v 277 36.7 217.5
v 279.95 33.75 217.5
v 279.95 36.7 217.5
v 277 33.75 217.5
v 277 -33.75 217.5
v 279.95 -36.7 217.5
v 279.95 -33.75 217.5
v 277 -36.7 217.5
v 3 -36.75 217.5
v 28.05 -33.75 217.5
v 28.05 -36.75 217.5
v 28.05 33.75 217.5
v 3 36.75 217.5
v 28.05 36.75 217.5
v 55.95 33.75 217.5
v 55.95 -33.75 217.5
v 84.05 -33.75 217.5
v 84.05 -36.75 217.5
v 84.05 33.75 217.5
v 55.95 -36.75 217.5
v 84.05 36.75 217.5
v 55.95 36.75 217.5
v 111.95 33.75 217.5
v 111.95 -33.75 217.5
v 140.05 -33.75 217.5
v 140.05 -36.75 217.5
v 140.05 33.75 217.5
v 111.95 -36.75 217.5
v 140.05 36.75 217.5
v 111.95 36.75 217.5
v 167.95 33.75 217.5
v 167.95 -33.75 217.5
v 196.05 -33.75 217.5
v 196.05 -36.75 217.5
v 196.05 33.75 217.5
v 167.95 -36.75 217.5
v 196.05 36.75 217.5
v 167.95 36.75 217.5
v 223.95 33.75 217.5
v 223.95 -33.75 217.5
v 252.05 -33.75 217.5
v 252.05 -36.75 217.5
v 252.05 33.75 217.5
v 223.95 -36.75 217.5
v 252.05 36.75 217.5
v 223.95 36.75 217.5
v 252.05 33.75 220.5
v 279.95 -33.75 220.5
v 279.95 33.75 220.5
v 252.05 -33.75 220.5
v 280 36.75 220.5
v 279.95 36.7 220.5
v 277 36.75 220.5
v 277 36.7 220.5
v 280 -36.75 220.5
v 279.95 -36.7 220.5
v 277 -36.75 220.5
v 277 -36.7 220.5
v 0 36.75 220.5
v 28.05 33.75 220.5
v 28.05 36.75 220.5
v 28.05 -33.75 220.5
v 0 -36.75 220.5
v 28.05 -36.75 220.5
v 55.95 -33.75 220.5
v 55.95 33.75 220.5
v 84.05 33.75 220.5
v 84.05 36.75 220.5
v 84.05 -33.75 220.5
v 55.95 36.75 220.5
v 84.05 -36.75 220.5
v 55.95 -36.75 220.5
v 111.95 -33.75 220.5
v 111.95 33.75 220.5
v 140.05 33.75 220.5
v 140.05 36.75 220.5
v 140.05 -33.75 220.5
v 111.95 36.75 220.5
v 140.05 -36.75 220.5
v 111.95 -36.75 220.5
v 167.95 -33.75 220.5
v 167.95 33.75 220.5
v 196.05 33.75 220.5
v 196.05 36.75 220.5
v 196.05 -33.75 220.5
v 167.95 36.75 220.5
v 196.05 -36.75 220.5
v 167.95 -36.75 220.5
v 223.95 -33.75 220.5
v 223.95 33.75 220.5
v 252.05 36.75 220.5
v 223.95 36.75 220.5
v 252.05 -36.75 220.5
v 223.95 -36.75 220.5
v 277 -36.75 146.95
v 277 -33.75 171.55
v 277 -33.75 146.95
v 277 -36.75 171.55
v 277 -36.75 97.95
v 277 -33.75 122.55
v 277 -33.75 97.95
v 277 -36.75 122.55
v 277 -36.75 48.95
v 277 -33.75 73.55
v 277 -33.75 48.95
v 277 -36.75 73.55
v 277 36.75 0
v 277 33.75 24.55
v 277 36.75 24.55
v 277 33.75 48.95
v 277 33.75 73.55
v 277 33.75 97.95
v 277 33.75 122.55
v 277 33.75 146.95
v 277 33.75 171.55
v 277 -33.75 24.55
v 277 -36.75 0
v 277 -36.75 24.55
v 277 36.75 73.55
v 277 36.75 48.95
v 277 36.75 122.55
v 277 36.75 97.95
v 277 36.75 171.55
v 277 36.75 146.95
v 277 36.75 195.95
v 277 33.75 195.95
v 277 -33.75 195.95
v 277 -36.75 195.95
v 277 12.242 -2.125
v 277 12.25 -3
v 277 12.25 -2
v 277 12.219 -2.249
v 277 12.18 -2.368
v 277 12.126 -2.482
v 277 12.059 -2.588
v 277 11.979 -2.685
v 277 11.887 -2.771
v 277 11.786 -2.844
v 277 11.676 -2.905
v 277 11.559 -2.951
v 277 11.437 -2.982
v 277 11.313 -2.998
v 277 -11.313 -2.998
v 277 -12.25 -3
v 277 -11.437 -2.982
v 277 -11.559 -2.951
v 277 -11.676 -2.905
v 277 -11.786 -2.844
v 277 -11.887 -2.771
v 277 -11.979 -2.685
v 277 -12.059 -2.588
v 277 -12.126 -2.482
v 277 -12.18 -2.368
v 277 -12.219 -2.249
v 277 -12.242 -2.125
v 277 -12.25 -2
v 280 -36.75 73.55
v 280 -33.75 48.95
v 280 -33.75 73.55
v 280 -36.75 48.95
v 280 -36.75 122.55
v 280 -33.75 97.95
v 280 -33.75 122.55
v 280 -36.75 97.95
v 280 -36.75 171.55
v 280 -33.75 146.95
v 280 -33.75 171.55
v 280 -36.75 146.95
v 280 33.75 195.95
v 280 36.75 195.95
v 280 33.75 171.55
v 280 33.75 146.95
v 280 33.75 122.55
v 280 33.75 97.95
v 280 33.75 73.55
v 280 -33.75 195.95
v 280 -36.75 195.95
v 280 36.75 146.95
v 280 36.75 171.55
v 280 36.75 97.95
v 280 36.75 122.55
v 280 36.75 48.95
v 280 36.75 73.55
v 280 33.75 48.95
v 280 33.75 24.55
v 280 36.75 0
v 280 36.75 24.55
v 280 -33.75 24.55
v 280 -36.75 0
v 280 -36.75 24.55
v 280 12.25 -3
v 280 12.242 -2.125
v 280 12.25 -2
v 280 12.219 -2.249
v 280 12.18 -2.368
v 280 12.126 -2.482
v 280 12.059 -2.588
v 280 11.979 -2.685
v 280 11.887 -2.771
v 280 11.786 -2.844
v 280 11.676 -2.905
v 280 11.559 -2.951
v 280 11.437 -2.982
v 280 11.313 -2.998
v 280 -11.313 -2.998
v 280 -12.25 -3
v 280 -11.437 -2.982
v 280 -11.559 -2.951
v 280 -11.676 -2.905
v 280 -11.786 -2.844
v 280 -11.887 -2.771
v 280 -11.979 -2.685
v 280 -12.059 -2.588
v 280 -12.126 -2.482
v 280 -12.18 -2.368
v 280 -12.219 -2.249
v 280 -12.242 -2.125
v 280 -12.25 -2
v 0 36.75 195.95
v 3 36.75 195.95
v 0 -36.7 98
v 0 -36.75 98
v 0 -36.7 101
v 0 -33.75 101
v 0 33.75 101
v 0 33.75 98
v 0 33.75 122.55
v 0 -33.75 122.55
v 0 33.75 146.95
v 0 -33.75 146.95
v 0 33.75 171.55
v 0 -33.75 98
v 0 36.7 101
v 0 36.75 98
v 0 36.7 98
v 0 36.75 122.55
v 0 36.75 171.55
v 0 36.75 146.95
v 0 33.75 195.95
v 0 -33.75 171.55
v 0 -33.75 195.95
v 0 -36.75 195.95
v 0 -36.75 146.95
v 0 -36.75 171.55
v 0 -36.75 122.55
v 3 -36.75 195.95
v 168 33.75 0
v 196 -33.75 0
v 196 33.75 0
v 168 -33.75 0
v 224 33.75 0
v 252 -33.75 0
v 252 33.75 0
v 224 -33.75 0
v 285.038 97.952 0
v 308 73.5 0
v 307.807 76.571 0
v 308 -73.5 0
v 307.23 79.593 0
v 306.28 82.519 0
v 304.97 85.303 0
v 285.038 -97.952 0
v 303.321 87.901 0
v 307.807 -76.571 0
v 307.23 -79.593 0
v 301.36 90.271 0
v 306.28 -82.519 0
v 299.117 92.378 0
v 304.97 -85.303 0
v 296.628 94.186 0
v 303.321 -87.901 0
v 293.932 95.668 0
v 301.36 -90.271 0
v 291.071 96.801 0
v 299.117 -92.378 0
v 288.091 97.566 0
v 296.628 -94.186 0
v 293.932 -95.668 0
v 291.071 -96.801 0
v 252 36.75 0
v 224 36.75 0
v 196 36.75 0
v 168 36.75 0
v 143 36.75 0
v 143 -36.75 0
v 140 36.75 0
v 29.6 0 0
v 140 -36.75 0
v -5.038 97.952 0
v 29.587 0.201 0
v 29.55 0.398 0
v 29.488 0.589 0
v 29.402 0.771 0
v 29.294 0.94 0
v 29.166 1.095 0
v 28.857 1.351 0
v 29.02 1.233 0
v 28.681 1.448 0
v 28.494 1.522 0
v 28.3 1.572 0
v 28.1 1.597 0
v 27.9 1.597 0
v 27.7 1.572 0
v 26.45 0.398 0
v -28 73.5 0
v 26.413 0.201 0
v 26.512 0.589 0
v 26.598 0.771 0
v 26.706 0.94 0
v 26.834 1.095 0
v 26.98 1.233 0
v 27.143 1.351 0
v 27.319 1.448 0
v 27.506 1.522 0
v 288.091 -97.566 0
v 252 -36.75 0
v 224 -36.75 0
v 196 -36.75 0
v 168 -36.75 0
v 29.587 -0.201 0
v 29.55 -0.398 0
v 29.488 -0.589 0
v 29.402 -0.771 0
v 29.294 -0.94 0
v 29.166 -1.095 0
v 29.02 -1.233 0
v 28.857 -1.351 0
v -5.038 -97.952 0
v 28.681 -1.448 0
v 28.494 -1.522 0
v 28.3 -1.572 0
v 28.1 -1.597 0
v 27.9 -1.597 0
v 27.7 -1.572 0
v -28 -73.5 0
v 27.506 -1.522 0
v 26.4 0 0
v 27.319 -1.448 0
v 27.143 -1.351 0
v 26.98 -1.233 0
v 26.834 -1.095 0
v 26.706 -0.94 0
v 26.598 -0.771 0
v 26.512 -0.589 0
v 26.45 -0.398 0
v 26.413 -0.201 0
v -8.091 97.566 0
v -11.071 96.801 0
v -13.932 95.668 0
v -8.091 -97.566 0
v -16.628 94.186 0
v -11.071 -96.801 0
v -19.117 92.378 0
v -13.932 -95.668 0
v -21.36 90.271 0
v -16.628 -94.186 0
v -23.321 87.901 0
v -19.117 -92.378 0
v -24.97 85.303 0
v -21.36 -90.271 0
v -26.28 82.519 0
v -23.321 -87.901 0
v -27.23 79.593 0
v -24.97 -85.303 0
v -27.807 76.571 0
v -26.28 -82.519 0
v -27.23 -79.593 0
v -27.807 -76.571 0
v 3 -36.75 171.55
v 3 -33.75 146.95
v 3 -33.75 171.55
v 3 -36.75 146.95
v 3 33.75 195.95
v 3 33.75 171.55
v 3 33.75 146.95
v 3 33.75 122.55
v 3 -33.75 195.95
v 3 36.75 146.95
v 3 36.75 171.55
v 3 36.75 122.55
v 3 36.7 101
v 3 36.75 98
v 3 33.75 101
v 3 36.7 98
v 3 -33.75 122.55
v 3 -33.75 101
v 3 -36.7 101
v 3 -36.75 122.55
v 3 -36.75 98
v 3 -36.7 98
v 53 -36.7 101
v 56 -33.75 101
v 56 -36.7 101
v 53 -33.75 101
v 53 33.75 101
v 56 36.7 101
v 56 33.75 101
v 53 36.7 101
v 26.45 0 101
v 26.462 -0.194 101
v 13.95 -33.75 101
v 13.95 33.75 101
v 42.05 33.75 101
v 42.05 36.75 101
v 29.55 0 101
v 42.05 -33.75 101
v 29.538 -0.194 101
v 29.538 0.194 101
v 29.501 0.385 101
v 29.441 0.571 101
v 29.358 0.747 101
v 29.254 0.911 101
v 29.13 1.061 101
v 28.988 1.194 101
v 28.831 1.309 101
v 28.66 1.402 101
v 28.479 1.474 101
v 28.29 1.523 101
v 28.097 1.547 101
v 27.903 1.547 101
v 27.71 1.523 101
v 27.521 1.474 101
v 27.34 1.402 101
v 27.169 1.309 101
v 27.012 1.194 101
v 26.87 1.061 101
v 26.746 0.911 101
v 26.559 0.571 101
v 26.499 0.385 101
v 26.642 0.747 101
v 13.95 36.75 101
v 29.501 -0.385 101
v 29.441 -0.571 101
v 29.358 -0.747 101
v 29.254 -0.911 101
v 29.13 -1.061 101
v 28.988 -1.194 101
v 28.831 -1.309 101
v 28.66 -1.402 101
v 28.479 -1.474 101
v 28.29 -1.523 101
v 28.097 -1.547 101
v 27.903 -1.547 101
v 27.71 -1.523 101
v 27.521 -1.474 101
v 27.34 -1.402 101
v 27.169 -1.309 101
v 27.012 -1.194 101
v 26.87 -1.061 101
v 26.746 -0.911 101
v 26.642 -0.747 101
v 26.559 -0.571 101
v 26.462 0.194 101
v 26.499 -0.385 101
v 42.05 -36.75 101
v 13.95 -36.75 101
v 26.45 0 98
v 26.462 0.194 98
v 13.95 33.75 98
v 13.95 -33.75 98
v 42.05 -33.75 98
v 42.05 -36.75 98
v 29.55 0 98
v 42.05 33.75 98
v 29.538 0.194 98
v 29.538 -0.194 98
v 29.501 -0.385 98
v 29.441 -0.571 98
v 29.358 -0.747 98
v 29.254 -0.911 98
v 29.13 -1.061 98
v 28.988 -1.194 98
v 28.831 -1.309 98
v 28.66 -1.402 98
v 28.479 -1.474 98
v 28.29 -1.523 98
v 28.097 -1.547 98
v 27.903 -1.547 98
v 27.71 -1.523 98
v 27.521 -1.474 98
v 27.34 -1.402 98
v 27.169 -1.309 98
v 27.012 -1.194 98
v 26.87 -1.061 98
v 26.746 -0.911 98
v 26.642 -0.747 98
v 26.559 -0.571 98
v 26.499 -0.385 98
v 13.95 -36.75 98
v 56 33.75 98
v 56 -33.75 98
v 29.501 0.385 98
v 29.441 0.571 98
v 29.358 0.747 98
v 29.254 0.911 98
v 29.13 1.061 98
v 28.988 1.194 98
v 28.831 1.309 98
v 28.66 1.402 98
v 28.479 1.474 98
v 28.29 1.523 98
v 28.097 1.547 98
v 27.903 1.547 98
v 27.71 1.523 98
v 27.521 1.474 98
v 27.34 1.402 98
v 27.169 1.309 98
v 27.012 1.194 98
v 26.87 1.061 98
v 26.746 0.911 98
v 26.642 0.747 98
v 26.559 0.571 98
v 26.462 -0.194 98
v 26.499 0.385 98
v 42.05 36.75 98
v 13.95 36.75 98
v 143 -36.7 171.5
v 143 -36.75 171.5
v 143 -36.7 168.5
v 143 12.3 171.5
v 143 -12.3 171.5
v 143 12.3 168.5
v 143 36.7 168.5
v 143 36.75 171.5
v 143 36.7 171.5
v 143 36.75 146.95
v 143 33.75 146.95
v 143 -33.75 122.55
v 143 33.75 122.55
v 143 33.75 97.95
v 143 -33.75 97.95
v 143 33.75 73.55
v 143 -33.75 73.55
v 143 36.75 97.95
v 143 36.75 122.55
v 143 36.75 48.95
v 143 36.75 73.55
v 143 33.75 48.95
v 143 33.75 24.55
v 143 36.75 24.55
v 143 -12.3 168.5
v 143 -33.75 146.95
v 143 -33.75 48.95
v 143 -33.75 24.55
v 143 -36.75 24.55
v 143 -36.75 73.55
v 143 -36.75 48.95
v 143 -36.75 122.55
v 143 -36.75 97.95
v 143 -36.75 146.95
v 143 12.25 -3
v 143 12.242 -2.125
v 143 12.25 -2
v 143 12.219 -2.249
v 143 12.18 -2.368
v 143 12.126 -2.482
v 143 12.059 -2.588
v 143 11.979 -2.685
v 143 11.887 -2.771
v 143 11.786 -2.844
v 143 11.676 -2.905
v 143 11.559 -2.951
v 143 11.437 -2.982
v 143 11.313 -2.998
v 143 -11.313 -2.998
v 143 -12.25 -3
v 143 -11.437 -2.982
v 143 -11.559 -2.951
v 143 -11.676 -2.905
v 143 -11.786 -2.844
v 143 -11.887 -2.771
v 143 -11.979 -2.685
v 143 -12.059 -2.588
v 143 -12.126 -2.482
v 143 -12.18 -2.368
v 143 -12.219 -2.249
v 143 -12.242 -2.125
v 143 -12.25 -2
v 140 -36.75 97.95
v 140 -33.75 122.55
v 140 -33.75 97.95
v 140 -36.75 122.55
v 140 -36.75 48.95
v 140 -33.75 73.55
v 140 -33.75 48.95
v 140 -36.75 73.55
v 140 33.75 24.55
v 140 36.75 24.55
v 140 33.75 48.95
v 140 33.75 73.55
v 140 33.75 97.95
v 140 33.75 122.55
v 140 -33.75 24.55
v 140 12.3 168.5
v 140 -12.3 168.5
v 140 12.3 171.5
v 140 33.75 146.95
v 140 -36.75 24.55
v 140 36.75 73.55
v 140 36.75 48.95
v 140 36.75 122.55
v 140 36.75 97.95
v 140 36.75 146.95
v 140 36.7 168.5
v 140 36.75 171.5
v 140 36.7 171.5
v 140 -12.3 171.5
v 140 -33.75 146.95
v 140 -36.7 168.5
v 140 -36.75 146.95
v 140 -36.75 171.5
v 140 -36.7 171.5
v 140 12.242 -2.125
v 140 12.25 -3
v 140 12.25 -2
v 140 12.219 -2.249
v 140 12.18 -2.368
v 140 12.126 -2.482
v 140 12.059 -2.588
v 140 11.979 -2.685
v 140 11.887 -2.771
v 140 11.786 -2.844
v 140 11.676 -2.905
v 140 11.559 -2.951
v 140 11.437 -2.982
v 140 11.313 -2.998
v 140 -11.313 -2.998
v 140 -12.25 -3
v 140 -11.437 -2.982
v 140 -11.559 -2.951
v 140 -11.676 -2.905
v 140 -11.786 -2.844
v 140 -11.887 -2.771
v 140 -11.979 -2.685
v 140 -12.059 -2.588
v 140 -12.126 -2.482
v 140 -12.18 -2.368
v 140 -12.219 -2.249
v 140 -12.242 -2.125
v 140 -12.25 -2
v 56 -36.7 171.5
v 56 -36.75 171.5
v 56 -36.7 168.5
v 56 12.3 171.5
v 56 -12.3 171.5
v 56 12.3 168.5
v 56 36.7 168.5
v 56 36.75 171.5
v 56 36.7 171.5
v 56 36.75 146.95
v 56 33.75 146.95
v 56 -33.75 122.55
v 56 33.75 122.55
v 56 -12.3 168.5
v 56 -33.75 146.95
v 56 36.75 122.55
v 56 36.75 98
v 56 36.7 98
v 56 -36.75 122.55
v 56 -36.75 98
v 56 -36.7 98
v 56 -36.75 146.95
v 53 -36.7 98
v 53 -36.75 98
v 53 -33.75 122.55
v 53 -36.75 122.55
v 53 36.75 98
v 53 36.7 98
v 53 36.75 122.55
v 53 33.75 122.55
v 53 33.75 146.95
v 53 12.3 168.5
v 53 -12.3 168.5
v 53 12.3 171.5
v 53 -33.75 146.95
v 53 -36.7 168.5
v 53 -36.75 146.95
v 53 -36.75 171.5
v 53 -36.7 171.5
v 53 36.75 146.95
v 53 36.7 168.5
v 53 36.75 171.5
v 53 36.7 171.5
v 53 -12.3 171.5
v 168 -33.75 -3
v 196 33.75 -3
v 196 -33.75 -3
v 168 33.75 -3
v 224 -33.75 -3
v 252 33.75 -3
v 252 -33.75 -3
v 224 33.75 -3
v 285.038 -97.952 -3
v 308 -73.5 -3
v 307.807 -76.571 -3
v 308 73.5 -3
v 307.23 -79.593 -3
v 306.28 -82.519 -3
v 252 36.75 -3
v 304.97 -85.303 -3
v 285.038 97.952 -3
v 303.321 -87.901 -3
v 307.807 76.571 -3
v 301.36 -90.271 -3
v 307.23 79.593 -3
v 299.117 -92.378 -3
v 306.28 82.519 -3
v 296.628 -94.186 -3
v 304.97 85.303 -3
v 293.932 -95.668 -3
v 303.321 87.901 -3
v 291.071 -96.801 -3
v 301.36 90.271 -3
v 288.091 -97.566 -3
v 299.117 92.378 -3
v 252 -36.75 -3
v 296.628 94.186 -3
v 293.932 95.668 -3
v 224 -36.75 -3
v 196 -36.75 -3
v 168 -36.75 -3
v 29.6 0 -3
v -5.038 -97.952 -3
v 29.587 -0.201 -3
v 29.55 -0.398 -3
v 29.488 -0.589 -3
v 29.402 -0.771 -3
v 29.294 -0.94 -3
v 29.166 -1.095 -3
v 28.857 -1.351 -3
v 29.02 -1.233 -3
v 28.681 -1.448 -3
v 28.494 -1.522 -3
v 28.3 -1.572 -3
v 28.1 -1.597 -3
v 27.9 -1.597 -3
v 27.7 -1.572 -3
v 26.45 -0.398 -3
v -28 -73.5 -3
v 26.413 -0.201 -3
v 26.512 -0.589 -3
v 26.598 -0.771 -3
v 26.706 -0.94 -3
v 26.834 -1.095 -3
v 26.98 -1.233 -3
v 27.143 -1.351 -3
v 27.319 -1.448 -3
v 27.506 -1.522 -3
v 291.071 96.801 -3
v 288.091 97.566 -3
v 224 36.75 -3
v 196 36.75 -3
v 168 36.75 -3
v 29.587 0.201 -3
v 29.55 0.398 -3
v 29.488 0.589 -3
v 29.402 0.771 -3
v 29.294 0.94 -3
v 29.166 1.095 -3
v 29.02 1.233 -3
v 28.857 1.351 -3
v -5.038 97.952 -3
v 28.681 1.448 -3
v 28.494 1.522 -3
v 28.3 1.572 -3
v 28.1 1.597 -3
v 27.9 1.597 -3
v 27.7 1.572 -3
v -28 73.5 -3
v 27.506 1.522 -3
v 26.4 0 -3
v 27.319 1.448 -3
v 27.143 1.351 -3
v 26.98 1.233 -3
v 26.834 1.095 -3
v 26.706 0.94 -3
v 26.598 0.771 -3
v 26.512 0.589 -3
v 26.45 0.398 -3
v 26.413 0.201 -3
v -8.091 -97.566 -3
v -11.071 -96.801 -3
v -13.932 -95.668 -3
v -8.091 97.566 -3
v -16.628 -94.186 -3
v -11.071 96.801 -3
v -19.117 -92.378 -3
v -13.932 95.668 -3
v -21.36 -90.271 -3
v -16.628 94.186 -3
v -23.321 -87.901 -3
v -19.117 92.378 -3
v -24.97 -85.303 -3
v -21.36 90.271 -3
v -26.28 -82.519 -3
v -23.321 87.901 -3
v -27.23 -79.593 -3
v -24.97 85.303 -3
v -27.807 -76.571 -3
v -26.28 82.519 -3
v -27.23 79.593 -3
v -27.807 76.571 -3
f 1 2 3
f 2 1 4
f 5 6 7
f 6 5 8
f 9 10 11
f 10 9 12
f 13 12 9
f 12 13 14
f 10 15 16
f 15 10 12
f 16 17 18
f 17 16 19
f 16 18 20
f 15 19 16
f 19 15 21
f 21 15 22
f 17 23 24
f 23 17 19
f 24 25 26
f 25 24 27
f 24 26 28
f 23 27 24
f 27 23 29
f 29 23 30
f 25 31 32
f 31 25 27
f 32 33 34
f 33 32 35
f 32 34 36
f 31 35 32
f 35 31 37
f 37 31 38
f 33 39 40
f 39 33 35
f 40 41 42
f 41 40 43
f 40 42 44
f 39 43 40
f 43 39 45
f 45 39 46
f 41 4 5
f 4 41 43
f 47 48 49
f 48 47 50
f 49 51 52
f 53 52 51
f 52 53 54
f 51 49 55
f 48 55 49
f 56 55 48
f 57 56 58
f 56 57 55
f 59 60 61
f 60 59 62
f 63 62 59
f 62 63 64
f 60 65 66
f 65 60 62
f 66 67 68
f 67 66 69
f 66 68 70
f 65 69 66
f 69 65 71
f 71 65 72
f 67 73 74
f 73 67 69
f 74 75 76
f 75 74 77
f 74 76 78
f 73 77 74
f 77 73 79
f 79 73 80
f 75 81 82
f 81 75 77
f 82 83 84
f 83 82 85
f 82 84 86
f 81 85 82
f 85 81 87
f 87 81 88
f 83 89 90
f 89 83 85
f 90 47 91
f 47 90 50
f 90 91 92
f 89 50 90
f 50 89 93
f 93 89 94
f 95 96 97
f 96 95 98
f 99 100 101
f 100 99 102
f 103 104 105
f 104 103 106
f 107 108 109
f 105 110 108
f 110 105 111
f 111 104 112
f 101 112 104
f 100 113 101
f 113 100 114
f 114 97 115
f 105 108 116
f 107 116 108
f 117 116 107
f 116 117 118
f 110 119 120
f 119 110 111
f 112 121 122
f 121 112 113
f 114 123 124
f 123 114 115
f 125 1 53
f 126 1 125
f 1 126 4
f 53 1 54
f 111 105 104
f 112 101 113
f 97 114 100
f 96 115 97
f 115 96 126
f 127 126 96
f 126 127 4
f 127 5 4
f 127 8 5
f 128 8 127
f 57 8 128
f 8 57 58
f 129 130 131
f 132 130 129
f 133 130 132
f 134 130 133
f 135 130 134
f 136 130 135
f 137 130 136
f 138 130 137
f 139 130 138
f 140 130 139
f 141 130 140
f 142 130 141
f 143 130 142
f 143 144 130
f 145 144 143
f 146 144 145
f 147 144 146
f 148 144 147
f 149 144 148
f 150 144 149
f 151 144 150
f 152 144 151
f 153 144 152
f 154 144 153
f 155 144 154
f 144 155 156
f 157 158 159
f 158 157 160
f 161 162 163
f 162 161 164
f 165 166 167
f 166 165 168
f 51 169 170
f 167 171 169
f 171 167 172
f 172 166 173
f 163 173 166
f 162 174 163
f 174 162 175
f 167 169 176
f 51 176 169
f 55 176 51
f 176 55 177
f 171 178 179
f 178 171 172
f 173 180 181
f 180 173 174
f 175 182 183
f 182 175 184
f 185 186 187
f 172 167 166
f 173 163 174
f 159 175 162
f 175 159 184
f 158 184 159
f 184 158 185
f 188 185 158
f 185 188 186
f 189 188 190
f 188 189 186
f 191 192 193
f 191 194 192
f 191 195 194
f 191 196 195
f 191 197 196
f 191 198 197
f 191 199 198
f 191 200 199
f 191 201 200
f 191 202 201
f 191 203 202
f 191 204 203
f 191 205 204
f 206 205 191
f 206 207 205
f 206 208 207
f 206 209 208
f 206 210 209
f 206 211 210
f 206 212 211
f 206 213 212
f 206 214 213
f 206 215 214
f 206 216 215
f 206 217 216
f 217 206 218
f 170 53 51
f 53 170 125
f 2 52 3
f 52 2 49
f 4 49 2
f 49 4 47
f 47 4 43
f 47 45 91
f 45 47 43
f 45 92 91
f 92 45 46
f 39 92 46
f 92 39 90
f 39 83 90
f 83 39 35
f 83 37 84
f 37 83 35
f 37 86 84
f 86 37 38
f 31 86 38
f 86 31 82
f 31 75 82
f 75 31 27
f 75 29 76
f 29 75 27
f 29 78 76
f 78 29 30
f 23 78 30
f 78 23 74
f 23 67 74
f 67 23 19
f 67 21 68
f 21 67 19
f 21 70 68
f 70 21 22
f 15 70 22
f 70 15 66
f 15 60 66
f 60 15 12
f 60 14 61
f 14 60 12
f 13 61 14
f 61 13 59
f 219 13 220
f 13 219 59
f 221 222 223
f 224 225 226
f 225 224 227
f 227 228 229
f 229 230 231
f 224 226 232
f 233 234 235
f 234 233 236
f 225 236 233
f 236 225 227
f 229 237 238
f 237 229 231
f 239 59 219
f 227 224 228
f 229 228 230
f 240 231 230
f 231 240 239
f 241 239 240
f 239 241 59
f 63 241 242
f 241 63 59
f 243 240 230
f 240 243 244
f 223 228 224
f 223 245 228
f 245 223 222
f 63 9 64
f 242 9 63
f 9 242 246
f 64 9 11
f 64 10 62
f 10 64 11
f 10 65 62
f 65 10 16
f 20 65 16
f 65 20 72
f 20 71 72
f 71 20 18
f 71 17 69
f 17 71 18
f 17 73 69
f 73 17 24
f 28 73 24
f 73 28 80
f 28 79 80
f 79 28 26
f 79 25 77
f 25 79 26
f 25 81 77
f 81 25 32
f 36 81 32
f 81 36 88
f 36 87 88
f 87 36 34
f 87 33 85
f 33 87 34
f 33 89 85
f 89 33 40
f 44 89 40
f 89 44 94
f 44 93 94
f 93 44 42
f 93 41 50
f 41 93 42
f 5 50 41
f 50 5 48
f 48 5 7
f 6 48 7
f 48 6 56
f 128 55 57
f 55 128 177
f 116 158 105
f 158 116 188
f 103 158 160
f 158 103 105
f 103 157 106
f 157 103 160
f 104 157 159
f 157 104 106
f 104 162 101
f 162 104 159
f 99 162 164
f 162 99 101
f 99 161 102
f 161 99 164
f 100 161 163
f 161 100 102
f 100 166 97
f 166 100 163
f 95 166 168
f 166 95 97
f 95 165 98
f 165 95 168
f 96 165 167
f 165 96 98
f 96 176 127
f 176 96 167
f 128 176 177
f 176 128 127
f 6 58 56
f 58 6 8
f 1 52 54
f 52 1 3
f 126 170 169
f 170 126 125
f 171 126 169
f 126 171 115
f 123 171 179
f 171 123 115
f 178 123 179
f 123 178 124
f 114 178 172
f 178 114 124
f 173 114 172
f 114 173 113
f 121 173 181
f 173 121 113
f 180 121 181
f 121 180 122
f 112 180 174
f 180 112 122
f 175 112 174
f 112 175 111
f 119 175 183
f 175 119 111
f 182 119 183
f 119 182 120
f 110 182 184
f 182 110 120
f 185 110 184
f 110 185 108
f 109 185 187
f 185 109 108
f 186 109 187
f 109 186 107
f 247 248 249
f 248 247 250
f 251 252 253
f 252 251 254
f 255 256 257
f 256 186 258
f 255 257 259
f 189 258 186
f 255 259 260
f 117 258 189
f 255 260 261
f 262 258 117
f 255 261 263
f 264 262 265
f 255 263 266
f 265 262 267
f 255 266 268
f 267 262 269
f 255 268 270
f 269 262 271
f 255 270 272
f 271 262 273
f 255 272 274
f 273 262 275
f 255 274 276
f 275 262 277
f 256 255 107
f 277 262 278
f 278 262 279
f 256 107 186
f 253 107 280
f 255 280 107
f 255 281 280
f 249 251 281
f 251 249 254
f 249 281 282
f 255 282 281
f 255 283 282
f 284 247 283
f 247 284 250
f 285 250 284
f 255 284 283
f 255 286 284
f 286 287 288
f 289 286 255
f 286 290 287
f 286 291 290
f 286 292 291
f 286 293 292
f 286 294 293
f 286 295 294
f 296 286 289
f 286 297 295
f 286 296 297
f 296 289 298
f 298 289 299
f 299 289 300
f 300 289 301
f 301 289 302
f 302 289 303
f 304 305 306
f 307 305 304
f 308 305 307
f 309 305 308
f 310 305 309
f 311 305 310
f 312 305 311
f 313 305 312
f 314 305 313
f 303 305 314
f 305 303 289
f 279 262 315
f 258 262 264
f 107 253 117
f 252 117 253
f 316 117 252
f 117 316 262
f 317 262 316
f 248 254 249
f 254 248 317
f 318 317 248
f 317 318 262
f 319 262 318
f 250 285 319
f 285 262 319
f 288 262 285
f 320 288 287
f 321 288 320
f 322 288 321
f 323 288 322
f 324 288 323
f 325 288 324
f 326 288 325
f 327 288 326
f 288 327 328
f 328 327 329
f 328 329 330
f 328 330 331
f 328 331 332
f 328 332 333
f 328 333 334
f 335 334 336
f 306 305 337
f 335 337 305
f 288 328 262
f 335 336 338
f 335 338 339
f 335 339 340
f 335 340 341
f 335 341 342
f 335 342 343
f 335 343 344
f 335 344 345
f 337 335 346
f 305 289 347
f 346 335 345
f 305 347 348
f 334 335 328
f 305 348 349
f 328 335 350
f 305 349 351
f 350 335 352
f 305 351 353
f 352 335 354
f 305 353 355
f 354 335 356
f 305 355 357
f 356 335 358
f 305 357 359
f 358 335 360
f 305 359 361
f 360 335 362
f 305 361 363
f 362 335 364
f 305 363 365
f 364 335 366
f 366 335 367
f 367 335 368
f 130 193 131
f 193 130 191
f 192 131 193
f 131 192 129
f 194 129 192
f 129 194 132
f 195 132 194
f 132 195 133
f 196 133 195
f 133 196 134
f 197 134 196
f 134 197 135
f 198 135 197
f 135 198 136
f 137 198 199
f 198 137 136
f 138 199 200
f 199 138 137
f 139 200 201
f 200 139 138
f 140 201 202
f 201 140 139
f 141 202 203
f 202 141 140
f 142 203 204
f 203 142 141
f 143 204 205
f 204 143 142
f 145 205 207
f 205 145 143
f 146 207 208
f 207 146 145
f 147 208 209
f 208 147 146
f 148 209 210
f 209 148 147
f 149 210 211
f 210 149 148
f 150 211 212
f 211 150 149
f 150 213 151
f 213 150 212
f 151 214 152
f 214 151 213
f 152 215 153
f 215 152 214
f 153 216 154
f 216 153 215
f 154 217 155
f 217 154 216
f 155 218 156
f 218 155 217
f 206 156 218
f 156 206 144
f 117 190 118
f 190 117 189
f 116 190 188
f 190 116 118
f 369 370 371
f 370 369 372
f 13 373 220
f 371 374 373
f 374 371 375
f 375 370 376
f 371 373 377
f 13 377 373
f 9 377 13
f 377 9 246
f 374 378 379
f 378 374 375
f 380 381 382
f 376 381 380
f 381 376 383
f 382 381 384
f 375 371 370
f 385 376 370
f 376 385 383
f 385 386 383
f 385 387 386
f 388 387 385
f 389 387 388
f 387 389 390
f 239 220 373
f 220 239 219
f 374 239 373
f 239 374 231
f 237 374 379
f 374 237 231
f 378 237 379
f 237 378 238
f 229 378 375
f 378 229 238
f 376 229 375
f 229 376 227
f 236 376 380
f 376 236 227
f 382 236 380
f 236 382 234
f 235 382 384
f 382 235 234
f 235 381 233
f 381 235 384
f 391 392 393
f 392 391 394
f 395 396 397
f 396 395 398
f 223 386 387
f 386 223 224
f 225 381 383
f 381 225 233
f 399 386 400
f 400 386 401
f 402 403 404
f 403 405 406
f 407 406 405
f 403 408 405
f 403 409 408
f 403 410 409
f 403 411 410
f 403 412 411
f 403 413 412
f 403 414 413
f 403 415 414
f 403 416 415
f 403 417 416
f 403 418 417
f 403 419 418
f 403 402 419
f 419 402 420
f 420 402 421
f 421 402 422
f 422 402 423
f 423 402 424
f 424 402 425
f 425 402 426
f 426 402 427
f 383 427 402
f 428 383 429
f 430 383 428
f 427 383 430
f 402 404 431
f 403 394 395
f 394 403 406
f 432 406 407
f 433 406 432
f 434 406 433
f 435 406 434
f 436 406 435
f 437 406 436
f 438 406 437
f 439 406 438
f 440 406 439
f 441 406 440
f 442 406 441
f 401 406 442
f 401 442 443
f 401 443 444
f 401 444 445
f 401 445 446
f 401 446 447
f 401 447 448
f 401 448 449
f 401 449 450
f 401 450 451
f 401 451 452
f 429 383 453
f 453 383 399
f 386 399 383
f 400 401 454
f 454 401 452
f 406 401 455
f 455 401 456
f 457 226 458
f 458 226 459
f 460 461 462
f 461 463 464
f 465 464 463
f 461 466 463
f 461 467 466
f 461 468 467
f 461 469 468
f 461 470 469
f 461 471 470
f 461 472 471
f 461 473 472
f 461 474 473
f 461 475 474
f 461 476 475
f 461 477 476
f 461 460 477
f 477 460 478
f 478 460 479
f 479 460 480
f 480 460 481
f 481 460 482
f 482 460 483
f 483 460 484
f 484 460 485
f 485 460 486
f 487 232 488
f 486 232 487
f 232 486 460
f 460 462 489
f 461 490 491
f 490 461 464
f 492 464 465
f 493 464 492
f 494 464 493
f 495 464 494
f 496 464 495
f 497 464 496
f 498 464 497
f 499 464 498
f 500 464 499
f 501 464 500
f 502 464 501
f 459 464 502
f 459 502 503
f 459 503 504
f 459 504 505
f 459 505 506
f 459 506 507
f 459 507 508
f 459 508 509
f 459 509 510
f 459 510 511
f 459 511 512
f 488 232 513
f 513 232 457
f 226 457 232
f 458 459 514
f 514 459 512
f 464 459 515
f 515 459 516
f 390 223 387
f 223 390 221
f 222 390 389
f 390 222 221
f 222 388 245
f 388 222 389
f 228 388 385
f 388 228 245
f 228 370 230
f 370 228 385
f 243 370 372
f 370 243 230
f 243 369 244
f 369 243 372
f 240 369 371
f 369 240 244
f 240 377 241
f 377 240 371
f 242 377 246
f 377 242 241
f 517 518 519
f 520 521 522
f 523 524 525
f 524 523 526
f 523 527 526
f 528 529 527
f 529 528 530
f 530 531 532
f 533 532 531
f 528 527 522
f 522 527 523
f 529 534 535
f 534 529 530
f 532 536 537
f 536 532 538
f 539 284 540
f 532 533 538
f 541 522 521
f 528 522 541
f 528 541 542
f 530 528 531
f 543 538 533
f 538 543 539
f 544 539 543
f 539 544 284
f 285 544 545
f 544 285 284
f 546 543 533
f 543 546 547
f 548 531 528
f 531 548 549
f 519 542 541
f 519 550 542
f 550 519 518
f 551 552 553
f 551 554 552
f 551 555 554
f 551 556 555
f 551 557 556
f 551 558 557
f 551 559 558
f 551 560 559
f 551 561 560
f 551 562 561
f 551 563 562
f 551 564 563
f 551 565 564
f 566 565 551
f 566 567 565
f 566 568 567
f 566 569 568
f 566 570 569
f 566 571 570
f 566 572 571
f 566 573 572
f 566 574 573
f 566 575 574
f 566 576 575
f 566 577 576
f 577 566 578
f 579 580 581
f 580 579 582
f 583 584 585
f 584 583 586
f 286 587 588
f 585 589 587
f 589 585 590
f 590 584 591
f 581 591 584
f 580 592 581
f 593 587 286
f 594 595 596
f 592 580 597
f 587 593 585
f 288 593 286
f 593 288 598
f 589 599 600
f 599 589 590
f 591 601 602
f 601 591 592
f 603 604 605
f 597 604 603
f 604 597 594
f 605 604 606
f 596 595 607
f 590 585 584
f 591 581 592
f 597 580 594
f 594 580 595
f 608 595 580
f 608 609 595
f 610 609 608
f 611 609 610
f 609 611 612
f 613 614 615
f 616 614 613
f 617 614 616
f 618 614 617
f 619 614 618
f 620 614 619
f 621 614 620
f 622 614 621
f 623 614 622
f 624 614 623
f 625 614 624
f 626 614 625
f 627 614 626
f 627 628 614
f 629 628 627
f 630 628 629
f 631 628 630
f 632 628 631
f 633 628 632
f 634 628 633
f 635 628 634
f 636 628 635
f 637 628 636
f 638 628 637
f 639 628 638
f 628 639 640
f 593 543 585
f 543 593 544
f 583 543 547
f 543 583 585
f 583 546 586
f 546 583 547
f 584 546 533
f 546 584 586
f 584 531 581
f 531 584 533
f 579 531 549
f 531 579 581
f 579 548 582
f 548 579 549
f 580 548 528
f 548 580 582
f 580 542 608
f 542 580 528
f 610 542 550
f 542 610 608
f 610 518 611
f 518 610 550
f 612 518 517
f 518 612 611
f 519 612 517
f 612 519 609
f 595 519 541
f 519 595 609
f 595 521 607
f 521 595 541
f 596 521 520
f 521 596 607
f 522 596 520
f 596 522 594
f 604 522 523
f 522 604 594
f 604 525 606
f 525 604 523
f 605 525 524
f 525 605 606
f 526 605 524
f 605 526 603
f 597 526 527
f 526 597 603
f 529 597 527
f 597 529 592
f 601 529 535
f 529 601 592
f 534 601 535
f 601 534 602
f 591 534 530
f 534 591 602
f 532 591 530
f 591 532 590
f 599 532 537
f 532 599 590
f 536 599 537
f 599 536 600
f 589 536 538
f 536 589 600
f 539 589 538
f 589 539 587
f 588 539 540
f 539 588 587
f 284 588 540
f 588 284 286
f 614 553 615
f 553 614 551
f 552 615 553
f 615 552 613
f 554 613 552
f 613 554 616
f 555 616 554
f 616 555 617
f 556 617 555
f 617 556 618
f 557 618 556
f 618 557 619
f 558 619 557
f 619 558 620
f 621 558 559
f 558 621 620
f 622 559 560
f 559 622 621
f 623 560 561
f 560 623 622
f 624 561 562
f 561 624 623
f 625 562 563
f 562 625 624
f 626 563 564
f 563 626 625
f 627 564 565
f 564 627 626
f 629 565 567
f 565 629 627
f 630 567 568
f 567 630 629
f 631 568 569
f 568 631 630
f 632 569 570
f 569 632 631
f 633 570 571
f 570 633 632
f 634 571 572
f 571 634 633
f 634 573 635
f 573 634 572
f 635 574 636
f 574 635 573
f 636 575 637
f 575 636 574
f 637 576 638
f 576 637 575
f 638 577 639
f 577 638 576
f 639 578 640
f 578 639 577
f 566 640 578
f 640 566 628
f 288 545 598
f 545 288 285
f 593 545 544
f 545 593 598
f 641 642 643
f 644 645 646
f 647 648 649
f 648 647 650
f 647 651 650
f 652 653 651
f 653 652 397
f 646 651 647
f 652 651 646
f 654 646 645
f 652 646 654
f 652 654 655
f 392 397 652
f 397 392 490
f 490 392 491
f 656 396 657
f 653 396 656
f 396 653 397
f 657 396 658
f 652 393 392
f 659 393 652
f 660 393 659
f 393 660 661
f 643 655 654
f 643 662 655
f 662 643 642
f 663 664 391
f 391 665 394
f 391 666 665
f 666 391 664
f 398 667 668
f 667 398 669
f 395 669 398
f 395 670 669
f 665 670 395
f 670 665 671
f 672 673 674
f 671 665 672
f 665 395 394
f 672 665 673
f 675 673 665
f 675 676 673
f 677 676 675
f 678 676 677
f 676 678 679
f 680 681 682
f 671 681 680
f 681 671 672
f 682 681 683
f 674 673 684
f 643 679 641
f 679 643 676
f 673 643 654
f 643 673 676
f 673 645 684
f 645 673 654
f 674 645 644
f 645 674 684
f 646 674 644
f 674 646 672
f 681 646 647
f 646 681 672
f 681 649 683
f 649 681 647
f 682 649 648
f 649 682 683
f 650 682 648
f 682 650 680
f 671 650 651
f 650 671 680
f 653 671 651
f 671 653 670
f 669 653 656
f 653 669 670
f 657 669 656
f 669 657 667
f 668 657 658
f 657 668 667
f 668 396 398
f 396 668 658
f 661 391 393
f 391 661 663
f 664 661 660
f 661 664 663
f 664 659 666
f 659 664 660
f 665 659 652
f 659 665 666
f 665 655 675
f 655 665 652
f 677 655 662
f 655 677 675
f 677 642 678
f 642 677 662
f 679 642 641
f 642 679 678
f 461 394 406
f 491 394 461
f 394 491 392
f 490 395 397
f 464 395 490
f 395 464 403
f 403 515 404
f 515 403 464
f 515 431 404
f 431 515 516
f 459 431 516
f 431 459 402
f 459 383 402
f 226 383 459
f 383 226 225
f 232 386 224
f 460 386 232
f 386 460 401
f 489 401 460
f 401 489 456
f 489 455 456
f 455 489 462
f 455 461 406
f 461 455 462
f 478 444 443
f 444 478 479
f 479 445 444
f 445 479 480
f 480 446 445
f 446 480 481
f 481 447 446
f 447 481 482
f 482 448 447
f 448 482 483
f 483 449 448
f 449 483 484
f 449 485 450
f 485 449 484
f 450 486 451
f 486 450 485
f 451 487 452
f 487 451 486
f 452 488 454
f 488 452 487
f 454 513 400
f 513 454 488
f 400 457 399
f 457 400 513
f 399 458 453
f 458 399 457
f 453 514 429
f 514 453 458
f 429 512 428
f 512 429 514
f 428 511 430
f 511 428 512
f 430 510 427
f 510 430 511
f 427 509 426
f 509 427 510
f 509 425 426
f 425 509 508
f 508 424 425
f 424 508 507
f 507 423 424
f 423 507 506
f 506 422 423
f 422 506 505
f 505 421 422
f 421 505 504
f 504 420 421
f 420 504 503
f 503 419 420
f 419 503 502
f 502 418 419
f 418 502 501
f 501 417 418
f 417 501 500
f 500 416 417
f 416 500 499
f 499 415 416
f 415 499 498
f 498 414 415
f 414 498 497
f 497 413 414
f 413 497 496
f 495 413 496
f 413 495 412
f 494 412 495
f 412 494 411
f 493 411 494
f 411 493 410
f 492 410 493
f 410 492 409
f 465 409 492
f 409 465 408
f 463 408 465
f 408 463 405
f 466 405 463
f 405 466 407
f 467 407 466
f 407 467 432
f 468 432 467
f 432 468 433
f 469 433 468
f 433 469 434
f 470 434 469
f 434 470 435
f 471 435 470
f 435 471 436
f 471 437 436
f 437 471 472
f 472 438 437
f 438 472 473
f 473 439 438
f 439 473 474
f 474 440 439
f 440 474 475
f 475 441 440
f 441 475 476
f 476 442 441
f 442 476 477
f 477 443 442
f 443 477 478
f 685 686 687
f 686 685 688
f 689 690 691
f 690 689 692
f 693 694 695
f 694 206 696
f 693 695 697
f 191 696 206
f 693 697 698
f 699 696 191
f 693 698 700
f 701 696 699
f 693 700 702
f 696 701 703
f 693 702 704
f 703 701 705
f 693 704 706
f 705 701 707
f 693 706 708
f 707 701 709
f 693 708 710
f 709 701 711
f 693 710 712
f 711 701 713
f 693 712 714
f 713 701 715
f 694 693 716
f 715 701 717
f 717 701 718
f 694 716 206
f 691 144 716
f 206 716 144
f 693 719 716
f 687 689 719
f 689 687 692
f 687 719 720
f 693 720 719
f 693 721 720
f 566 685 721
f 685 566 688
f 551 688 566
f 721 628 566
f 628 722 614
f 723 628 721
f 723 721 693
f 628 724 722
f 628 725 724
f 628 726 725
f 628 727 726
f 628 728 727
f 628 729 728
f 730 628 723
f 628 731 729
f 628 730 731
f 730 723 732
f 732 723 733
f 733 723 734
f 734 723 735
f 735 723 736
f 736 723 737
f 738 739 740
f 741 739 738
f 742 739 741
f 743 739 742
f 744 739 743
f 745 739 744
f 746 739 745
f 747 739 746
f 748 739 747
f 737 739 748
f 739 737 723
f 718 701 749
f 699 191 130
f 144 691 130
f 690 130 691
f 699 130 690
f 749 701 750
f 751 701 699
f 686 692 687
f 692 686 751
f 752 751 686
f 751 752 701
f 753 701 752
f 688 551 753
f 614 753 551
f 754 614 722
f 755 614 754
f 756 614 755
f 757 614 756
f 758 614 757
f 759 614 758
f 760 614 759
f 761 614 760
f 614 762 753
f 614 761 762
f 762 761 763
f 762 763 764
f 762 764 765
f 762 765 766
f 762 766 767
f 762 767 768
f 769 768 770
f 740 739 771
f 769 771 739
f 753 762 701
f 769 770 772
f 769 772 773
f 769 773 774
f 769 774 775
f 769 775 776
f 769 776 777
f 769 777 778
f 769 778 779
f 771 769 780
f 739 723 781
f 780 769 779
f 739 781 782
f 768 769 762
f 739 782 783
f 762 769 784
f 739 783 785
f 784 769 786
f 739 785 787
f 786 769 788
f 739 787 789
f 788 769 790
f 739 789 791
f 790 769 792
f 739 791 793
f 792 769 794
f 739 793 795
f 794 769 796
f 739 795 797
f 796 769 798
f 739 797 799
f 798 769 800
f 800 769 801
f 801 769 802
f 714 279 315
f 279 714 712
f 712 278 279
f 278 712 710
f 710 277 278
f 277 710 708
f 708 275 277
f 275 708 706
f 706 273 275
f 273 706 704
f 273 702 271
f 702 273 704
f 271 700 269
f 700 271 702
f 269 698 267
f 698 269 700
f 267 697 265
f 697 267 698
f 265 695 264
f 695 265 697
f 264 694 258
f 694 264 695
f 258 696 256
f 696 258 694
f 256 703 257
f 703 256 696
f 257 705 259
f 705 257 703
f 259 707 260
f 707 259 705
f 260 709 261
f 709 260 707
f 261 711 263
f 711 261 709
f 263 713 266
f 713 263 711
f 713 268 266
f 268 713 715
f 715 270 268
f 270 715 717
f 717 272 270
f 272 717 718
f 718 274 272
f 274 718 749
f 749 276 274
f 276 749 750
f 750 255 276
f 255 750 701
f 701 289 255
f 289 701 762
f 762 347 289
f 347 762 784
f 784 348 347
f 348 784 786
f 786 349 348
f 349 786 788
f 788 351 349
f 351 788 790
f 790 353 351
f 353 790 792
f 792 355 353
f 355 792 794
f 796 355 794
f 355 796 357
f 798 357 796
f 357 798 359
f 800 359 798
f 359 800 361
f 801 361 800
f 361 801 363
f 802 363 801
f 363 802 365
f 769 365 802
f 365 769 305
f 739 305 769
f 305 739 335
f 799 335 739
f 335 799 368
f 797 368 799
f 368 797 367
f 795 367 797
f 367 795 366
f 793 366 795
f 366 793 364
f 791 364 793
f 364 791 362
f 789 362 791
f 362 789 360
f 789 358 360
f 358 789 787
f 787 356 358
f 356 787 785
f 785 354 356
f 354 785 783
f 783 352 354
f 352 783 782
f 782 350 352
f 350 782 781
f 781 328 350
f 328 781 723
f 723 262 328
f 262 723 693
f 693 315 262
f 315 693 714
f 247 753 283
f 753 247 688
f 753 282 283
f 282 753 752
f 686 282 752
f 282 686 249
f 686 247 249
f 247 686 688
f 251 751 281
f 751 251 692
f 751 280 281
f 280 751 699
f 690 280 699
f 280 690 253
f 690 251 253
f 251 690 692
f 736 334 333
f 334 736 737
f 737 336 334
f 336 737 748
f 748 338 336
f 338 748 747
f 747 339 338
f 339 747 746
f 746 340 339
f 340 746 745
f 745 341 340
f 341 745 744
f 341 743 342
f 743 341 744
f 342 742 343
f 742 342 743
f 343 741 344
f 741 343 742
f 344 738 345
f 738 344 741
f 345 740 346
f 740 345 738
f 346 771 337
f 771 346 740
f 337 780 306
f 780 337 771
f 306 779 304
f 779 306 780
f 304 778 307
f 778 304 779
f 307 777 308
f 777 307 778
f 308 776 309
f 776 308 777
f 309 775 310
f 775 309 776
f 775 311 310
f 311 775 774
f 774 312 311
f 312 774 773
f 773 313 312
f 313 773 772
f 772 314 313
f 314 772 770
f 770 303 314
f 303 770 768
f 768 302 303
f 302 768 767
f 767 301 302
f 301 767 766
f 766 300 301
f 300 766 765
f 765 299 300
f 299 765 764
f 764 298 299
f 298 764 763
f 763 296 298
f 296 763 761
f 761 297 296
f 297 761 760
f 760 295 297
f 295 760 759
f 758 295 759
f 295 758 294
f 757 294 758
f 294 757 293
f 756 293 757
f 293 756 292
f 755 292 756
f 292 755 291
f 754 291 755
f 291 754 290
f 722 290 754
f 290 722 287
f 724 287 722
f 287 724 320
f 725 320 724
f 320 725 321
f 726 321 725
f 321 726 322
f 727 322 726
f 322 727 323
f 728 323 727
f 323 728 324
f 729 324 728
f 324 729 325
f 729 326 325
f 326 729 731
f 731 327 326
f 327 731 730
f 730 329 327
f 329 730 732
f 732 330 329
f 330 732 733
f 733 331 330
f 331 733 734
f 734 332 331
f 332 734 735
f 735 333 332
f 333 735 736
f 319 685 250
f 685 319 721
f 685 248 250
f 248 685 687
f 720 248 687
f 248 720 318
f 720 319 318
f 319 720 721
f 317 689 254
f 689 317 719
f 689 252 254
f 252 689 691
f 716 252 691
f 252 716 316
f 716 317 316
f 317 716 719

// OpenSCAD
tileDims=[28,24.5,20]; //ferrero Küsschen
ovTileCnt=[10,3,9]; 
headTilesX=2;
headTilesZ=3;
bodyTilesX=5;
bodyTilesZ=7;
baseBrimTiles=[2,5];
baseRad=tileDims.y;
spcng=0;
kerf=0.1;
matThck=3;

/*[show]*/
showFaces=false;
showTop=true;
showRight=true;
showLeft=true;
showbodyLeft=true;
showHeadRight=true;
showHeadBottom=true;
showBase=true;
isolate="none"; //["none","base","face","kerfTest"]


/* [Hidden] */
headTileCnt=[headTilesX,ovTileCnt.y,headTilesZ];
bodyTileCnt=[bodyTilesX,ovTileCnt.y,bodyTilesZ];
topTileCnt=[ovTileCnt.x,ovTileCnt.y,ovTileCnt.z-bodyTileCnt.z];
ovDims=[ovTileCnt.x*tileDims.x,ovTileCnt.y*tileDims.y,ovTileCnt.z*tileDims.y];
headDims=[headTileCnt.x*tileDims.x,ovTileCnt.y*tileDims.y,headTileCnt.z*tileDims.y];
bodyDims=[bodyTileCnt.x*tileDims.x,ovTileCnt.y*tileDims.y,bodyTileCnt.z*tileDims.y];
topDims=[ovTileCnt.x*tileDims.x,ovTileCnt.y*tileDims.y,topTileCnt.z*tileDims.y];
//base from tileDims and brims
baseDims=[(ovTileCnt.x+baseBrimTiles.x)*tileDims.x,(ovTileCnt.y+baseBrimTiles.y)*tileDims.y];
$fn=50;
fudge=0.1;

//## Assembly ##
if (showFaces) for (iy=[-1,1])
  color("wheat") translate([0,iy*(tileDims.y*ovTileCnt.y-matThck)/2+matThck/2,0]) rotate([90,0,0]) linear_extrude(matThck) face();
if (showTop)
  color("burlyWood") translate([0,-ovDims.y/2,ovDims.z-matThck]) linear_extrude(matThck) top();
if (showRight)
  color("tan") translate([ovDims.x,-ovDims.y/2,0]) rotate([0,-90,0]) linear_extrude(matThck) right();
if (showLeft)
  color("tan") translate([matThck,-ovDims.y/2,ovDims.z-headDims.z-topDims.z]) rotate([0,-90,0]) linear_extrude(matThck) left();
if (showbodyLeft)
  color("tan") translate([ovDims.x-bodyDims.x+matThck,-ovDims.y/2,0]) rotate([0,-90,0]) linear_extrude(matThck) bodyLeft();
if (showHeadRight)
  color("tan") translate([headDims.x,-ovDims.y/2,ovDims.z-topDims.z-headDims.z]) rotate([0,-90,0]) linear_extrude(matThck) headRight();
if (showHeadBottom)
  color("burlyWood") translate([0,-ovDims.y/2,ovDims.z-topDims.z-headDims.z]) linear_extrude(matThck) headBottom();
if (showBase)
  color("burlyWood")  translate([0,0,-matThck]) linear_extrude(matThck) base();

//## Export ##
if (isolate=="base")
  !base();
if (isolate=="face")
  !face();
if (isolate=="kerfTest")
  !kerfTest();


*linear_extrude(matThck) kerfTest();
module kerfTest(size=[30,20]){
  rad=3;
  difference(){
    hull() for (ix=[-1,1],iy=[-1,1])
      translate([ix*(size.x/2-rad),iy*(size.y/2-rad)]) circle(rad);
    square([size.x*2/3-kerf,matThck],true);
    translate([0,-(size.y-matThck)/2]) square([size.x*2/3-kerf,matThck],true);
    translate([0,matThck]) text(str("kerf=", kerf),size=matThck,halign="center",font="Stencil:style=Regular");
  }
  translate([0,(size.y+matThck-fudge)/2]) square([size.x*2/3+kerf,matThck+fudge],true);
  
}

*left();
module left(){
  wall([headTileCnt.z+topTileCnt.z,ovTileCnt.y],[tileDims.y,tileDims.y],[1,0.5]);
}

*right();
module right(){
  wall([ovTileCnt.z,ovTileCnt.y],[tileDims.y,tileDims.y],[1,0.5],enable=[0,1,1,1]);
  translate([0,ovDims.y/2]) rotate(-90) tap(size=[tileDims.y,3]);
}

*top();
module top(){
  wall([ovTileCnt.x,ovTileCnt.y],tileDims,[1,1.5]);
}

*bodyLeft();
module bodyLeft(){
  wall([bodyTileCnt.z,ovTileCnt.y],[tileDims.y,tileDims.y],[1,0.5],enable=[0,1,1,1]);
  translate([0,ovDims.y/2]) rotate(-90) tap(size=[tileDims.y,3]);
}

*headRight();
module headRight(){
  wall([headTileCnt.z,ovTileCnt.y],[tileDims.y,tileDims.y],[1,0.5]);
}

*headBottom();
module headBottom(){
  difference(){
    wall([headTileCnt.x,ovTileCnt.y],tileDims,[-0.5,1.5]);
    translate([headDims.x/2,headDims.y/2]) circle(d=3.1);
  }
}

module base(){
  bodyOffset=tileDims.x/2+ovDims.x-bodyDims.x;
  difference(){
    hull() for (ix=[-1,1],iy=[-1,1])
      translate([ix*(baseDims.x/2-baseRad),iy*(baseDims.y/2-baseRad)]+[baseDims.x/2-baseBrimTiles.x/2*tileDims.x,0]) circle(baseRad);
    //front and back slots
    for (ix=[1:2:(bodyTileCnt.x-1)], iy=[-1,1])
      translate([ix*tileDims.x+bodyOffset,iy*(tileDims.y*ovTileCnt.y-matThck)/2]) square([tileDims.x,matThck],true);
    //left and right slots
    for (ix=[-1,1],iy=[0:2:(bodyTileCnt.y-2)])
      translate([ix*(bodyDims.x-matThck)/2+ovDims.x-bodyDims.x/2,iy*(tileDims.y*ovTileCnt.y)/2]) square([matThck,tileDims.y],true);
    //hole for stabi
    translate([headDims.x/2,0]) circle(d=3.2);
  }
}

*wall([ovTileCnt.x,ovTileCnt.y]);
module wall(tiles=[5,5],tileDims=[10,10],start=[0,0],enable=[1,1,1,1]){
  wallDims=[tiles.x*tileDims.x,tiles.y*tileDims.y];
      difference(){
        square(wallDims);
        //front and back edge
        for (ix=[start.x:2:(tiles.x)], iy=[-1,1])
          if ((iy<0 && enable[2])||(iy>0 && enable[3]))
            translate([ix*tileDims.x+tileDims.x/2,iy*(wallDims.y-matThck+fudge)/2+wallDims.y/2]) square([tileDims.x-kerf,matThck+fudge],true);
        //left and right edge
        for (ix=[-1,1], iy=[start.y:2:(tiles.y)])
          if ((ix<0 && enable[0])||(ix>0 && enable[1]))
            translate([ix*(wallDims.x-matThck+fudge)/2+wallDims.x/2,iy*tileDims.y]) square([matThck+fudge,tileDims.y-kerf],true);
    }
}

module face(){
  //top
  topDims=[ovTileCnt.x*tileDims.x,(ovTileCnt.z-bodyTileCnt.z)*tileDims.y];

  headYOffset=(bodyTileCnt.z-headTileCnt.z)*tileDims.y;
  difference(){
    union(){
      translate([0,(bodyTileCnt.z)*tileDims.y]) square(topDims); //top
      translate([(ovTileCnt.x-bodyTileCnt.x)*tileDims.x,0]) square([bodyDims.x,bodyDims.z]); //body
      translate([0,headYOffset]) square([headDims.x,headDims.z]); //head
    }
    //top edge
    for (ix=[0:2:(ovTileCnt.x-1)])
      translate([ix*tileDims.x+tileDims.x/2,(ovTileCnt.z*tileDims.y-matThck+fudge)/2+ovDims.z/2]) square([tileDims.x-kerf,matThck+fudge],true);
    //head bottom
    for (ix=[0.5:2:(headTileCnt.x-1)])
      translate([ix*tileDims.x+tileDims.x/2,headYOffset+(matThck-fudge)/2]) square([tileDims.x-kerf,matThck+fudge],true);
    
    
    //left & right edge
    for (ix=[-1,1],iy=[0:2:(ovTileCnt.z-1)])
      translate([ix*(topDims.x-matThck+fudge)/2+topDims.x/2,iy*tileDims.y+tileDims.y/2]) square([matThck+fudge,tileDims.y-kerf],true);
    //head right
    for (iy=[0:2:(headTileCnt.z-1)])
      translate([headDims.x-(matThck-fudge)/2,iy*tileDims.y+(tileDims.y-fudge)/2+headYOffset]) square([matThck+fudge,tileDims.y-kerf],true);
    //body left
    for (iy=[0:2:(bodyTileCnt.z-1)])
      translate([ovDims.x-bodyDims.x+(matThck-fudge)/2,iy*tileDims.y+(tileDims.y-fudge)/2]) square([matThck+fudge,tileDims.y-kerf],true);
  }
  //bottom taps
  for (ix=[ovTileCnt.x-4:2:(ovTileCnt.x-1)])
    translate([ix*tileDims.x+tileDims.x/2,-(ovTileCnt.z*tileDims.y)/2+ovDims.z/2]) tap([tileDims.x+kerf,matThck]);
}

*tap();
module tap(size=[10,3],rad=1){
  translate([0,-size.y/2]){
    hull() for (ix=[-1,1])
    translate([ix*(size.x/2-rad),-size.y/2+rad]) circle(rad);
    translate([0,size.y/2-rad]) square([size.x,size.y-rad],true);
  }
}

*tile();
module tile(size=[20,10,10]){
  chamfer=0.8*size.y;
  //sweet
  cube([tileDims.x,tileDims.y,tileDims.z-chamfer]);
  translate([tileDims.x/2,tileDims.y/2,tileDims.z-chamfer]) 
    linear_extrude(chamfer,scale=[0.8,0.6]) square([tileDims.x,tileDims.y],true);
  }
